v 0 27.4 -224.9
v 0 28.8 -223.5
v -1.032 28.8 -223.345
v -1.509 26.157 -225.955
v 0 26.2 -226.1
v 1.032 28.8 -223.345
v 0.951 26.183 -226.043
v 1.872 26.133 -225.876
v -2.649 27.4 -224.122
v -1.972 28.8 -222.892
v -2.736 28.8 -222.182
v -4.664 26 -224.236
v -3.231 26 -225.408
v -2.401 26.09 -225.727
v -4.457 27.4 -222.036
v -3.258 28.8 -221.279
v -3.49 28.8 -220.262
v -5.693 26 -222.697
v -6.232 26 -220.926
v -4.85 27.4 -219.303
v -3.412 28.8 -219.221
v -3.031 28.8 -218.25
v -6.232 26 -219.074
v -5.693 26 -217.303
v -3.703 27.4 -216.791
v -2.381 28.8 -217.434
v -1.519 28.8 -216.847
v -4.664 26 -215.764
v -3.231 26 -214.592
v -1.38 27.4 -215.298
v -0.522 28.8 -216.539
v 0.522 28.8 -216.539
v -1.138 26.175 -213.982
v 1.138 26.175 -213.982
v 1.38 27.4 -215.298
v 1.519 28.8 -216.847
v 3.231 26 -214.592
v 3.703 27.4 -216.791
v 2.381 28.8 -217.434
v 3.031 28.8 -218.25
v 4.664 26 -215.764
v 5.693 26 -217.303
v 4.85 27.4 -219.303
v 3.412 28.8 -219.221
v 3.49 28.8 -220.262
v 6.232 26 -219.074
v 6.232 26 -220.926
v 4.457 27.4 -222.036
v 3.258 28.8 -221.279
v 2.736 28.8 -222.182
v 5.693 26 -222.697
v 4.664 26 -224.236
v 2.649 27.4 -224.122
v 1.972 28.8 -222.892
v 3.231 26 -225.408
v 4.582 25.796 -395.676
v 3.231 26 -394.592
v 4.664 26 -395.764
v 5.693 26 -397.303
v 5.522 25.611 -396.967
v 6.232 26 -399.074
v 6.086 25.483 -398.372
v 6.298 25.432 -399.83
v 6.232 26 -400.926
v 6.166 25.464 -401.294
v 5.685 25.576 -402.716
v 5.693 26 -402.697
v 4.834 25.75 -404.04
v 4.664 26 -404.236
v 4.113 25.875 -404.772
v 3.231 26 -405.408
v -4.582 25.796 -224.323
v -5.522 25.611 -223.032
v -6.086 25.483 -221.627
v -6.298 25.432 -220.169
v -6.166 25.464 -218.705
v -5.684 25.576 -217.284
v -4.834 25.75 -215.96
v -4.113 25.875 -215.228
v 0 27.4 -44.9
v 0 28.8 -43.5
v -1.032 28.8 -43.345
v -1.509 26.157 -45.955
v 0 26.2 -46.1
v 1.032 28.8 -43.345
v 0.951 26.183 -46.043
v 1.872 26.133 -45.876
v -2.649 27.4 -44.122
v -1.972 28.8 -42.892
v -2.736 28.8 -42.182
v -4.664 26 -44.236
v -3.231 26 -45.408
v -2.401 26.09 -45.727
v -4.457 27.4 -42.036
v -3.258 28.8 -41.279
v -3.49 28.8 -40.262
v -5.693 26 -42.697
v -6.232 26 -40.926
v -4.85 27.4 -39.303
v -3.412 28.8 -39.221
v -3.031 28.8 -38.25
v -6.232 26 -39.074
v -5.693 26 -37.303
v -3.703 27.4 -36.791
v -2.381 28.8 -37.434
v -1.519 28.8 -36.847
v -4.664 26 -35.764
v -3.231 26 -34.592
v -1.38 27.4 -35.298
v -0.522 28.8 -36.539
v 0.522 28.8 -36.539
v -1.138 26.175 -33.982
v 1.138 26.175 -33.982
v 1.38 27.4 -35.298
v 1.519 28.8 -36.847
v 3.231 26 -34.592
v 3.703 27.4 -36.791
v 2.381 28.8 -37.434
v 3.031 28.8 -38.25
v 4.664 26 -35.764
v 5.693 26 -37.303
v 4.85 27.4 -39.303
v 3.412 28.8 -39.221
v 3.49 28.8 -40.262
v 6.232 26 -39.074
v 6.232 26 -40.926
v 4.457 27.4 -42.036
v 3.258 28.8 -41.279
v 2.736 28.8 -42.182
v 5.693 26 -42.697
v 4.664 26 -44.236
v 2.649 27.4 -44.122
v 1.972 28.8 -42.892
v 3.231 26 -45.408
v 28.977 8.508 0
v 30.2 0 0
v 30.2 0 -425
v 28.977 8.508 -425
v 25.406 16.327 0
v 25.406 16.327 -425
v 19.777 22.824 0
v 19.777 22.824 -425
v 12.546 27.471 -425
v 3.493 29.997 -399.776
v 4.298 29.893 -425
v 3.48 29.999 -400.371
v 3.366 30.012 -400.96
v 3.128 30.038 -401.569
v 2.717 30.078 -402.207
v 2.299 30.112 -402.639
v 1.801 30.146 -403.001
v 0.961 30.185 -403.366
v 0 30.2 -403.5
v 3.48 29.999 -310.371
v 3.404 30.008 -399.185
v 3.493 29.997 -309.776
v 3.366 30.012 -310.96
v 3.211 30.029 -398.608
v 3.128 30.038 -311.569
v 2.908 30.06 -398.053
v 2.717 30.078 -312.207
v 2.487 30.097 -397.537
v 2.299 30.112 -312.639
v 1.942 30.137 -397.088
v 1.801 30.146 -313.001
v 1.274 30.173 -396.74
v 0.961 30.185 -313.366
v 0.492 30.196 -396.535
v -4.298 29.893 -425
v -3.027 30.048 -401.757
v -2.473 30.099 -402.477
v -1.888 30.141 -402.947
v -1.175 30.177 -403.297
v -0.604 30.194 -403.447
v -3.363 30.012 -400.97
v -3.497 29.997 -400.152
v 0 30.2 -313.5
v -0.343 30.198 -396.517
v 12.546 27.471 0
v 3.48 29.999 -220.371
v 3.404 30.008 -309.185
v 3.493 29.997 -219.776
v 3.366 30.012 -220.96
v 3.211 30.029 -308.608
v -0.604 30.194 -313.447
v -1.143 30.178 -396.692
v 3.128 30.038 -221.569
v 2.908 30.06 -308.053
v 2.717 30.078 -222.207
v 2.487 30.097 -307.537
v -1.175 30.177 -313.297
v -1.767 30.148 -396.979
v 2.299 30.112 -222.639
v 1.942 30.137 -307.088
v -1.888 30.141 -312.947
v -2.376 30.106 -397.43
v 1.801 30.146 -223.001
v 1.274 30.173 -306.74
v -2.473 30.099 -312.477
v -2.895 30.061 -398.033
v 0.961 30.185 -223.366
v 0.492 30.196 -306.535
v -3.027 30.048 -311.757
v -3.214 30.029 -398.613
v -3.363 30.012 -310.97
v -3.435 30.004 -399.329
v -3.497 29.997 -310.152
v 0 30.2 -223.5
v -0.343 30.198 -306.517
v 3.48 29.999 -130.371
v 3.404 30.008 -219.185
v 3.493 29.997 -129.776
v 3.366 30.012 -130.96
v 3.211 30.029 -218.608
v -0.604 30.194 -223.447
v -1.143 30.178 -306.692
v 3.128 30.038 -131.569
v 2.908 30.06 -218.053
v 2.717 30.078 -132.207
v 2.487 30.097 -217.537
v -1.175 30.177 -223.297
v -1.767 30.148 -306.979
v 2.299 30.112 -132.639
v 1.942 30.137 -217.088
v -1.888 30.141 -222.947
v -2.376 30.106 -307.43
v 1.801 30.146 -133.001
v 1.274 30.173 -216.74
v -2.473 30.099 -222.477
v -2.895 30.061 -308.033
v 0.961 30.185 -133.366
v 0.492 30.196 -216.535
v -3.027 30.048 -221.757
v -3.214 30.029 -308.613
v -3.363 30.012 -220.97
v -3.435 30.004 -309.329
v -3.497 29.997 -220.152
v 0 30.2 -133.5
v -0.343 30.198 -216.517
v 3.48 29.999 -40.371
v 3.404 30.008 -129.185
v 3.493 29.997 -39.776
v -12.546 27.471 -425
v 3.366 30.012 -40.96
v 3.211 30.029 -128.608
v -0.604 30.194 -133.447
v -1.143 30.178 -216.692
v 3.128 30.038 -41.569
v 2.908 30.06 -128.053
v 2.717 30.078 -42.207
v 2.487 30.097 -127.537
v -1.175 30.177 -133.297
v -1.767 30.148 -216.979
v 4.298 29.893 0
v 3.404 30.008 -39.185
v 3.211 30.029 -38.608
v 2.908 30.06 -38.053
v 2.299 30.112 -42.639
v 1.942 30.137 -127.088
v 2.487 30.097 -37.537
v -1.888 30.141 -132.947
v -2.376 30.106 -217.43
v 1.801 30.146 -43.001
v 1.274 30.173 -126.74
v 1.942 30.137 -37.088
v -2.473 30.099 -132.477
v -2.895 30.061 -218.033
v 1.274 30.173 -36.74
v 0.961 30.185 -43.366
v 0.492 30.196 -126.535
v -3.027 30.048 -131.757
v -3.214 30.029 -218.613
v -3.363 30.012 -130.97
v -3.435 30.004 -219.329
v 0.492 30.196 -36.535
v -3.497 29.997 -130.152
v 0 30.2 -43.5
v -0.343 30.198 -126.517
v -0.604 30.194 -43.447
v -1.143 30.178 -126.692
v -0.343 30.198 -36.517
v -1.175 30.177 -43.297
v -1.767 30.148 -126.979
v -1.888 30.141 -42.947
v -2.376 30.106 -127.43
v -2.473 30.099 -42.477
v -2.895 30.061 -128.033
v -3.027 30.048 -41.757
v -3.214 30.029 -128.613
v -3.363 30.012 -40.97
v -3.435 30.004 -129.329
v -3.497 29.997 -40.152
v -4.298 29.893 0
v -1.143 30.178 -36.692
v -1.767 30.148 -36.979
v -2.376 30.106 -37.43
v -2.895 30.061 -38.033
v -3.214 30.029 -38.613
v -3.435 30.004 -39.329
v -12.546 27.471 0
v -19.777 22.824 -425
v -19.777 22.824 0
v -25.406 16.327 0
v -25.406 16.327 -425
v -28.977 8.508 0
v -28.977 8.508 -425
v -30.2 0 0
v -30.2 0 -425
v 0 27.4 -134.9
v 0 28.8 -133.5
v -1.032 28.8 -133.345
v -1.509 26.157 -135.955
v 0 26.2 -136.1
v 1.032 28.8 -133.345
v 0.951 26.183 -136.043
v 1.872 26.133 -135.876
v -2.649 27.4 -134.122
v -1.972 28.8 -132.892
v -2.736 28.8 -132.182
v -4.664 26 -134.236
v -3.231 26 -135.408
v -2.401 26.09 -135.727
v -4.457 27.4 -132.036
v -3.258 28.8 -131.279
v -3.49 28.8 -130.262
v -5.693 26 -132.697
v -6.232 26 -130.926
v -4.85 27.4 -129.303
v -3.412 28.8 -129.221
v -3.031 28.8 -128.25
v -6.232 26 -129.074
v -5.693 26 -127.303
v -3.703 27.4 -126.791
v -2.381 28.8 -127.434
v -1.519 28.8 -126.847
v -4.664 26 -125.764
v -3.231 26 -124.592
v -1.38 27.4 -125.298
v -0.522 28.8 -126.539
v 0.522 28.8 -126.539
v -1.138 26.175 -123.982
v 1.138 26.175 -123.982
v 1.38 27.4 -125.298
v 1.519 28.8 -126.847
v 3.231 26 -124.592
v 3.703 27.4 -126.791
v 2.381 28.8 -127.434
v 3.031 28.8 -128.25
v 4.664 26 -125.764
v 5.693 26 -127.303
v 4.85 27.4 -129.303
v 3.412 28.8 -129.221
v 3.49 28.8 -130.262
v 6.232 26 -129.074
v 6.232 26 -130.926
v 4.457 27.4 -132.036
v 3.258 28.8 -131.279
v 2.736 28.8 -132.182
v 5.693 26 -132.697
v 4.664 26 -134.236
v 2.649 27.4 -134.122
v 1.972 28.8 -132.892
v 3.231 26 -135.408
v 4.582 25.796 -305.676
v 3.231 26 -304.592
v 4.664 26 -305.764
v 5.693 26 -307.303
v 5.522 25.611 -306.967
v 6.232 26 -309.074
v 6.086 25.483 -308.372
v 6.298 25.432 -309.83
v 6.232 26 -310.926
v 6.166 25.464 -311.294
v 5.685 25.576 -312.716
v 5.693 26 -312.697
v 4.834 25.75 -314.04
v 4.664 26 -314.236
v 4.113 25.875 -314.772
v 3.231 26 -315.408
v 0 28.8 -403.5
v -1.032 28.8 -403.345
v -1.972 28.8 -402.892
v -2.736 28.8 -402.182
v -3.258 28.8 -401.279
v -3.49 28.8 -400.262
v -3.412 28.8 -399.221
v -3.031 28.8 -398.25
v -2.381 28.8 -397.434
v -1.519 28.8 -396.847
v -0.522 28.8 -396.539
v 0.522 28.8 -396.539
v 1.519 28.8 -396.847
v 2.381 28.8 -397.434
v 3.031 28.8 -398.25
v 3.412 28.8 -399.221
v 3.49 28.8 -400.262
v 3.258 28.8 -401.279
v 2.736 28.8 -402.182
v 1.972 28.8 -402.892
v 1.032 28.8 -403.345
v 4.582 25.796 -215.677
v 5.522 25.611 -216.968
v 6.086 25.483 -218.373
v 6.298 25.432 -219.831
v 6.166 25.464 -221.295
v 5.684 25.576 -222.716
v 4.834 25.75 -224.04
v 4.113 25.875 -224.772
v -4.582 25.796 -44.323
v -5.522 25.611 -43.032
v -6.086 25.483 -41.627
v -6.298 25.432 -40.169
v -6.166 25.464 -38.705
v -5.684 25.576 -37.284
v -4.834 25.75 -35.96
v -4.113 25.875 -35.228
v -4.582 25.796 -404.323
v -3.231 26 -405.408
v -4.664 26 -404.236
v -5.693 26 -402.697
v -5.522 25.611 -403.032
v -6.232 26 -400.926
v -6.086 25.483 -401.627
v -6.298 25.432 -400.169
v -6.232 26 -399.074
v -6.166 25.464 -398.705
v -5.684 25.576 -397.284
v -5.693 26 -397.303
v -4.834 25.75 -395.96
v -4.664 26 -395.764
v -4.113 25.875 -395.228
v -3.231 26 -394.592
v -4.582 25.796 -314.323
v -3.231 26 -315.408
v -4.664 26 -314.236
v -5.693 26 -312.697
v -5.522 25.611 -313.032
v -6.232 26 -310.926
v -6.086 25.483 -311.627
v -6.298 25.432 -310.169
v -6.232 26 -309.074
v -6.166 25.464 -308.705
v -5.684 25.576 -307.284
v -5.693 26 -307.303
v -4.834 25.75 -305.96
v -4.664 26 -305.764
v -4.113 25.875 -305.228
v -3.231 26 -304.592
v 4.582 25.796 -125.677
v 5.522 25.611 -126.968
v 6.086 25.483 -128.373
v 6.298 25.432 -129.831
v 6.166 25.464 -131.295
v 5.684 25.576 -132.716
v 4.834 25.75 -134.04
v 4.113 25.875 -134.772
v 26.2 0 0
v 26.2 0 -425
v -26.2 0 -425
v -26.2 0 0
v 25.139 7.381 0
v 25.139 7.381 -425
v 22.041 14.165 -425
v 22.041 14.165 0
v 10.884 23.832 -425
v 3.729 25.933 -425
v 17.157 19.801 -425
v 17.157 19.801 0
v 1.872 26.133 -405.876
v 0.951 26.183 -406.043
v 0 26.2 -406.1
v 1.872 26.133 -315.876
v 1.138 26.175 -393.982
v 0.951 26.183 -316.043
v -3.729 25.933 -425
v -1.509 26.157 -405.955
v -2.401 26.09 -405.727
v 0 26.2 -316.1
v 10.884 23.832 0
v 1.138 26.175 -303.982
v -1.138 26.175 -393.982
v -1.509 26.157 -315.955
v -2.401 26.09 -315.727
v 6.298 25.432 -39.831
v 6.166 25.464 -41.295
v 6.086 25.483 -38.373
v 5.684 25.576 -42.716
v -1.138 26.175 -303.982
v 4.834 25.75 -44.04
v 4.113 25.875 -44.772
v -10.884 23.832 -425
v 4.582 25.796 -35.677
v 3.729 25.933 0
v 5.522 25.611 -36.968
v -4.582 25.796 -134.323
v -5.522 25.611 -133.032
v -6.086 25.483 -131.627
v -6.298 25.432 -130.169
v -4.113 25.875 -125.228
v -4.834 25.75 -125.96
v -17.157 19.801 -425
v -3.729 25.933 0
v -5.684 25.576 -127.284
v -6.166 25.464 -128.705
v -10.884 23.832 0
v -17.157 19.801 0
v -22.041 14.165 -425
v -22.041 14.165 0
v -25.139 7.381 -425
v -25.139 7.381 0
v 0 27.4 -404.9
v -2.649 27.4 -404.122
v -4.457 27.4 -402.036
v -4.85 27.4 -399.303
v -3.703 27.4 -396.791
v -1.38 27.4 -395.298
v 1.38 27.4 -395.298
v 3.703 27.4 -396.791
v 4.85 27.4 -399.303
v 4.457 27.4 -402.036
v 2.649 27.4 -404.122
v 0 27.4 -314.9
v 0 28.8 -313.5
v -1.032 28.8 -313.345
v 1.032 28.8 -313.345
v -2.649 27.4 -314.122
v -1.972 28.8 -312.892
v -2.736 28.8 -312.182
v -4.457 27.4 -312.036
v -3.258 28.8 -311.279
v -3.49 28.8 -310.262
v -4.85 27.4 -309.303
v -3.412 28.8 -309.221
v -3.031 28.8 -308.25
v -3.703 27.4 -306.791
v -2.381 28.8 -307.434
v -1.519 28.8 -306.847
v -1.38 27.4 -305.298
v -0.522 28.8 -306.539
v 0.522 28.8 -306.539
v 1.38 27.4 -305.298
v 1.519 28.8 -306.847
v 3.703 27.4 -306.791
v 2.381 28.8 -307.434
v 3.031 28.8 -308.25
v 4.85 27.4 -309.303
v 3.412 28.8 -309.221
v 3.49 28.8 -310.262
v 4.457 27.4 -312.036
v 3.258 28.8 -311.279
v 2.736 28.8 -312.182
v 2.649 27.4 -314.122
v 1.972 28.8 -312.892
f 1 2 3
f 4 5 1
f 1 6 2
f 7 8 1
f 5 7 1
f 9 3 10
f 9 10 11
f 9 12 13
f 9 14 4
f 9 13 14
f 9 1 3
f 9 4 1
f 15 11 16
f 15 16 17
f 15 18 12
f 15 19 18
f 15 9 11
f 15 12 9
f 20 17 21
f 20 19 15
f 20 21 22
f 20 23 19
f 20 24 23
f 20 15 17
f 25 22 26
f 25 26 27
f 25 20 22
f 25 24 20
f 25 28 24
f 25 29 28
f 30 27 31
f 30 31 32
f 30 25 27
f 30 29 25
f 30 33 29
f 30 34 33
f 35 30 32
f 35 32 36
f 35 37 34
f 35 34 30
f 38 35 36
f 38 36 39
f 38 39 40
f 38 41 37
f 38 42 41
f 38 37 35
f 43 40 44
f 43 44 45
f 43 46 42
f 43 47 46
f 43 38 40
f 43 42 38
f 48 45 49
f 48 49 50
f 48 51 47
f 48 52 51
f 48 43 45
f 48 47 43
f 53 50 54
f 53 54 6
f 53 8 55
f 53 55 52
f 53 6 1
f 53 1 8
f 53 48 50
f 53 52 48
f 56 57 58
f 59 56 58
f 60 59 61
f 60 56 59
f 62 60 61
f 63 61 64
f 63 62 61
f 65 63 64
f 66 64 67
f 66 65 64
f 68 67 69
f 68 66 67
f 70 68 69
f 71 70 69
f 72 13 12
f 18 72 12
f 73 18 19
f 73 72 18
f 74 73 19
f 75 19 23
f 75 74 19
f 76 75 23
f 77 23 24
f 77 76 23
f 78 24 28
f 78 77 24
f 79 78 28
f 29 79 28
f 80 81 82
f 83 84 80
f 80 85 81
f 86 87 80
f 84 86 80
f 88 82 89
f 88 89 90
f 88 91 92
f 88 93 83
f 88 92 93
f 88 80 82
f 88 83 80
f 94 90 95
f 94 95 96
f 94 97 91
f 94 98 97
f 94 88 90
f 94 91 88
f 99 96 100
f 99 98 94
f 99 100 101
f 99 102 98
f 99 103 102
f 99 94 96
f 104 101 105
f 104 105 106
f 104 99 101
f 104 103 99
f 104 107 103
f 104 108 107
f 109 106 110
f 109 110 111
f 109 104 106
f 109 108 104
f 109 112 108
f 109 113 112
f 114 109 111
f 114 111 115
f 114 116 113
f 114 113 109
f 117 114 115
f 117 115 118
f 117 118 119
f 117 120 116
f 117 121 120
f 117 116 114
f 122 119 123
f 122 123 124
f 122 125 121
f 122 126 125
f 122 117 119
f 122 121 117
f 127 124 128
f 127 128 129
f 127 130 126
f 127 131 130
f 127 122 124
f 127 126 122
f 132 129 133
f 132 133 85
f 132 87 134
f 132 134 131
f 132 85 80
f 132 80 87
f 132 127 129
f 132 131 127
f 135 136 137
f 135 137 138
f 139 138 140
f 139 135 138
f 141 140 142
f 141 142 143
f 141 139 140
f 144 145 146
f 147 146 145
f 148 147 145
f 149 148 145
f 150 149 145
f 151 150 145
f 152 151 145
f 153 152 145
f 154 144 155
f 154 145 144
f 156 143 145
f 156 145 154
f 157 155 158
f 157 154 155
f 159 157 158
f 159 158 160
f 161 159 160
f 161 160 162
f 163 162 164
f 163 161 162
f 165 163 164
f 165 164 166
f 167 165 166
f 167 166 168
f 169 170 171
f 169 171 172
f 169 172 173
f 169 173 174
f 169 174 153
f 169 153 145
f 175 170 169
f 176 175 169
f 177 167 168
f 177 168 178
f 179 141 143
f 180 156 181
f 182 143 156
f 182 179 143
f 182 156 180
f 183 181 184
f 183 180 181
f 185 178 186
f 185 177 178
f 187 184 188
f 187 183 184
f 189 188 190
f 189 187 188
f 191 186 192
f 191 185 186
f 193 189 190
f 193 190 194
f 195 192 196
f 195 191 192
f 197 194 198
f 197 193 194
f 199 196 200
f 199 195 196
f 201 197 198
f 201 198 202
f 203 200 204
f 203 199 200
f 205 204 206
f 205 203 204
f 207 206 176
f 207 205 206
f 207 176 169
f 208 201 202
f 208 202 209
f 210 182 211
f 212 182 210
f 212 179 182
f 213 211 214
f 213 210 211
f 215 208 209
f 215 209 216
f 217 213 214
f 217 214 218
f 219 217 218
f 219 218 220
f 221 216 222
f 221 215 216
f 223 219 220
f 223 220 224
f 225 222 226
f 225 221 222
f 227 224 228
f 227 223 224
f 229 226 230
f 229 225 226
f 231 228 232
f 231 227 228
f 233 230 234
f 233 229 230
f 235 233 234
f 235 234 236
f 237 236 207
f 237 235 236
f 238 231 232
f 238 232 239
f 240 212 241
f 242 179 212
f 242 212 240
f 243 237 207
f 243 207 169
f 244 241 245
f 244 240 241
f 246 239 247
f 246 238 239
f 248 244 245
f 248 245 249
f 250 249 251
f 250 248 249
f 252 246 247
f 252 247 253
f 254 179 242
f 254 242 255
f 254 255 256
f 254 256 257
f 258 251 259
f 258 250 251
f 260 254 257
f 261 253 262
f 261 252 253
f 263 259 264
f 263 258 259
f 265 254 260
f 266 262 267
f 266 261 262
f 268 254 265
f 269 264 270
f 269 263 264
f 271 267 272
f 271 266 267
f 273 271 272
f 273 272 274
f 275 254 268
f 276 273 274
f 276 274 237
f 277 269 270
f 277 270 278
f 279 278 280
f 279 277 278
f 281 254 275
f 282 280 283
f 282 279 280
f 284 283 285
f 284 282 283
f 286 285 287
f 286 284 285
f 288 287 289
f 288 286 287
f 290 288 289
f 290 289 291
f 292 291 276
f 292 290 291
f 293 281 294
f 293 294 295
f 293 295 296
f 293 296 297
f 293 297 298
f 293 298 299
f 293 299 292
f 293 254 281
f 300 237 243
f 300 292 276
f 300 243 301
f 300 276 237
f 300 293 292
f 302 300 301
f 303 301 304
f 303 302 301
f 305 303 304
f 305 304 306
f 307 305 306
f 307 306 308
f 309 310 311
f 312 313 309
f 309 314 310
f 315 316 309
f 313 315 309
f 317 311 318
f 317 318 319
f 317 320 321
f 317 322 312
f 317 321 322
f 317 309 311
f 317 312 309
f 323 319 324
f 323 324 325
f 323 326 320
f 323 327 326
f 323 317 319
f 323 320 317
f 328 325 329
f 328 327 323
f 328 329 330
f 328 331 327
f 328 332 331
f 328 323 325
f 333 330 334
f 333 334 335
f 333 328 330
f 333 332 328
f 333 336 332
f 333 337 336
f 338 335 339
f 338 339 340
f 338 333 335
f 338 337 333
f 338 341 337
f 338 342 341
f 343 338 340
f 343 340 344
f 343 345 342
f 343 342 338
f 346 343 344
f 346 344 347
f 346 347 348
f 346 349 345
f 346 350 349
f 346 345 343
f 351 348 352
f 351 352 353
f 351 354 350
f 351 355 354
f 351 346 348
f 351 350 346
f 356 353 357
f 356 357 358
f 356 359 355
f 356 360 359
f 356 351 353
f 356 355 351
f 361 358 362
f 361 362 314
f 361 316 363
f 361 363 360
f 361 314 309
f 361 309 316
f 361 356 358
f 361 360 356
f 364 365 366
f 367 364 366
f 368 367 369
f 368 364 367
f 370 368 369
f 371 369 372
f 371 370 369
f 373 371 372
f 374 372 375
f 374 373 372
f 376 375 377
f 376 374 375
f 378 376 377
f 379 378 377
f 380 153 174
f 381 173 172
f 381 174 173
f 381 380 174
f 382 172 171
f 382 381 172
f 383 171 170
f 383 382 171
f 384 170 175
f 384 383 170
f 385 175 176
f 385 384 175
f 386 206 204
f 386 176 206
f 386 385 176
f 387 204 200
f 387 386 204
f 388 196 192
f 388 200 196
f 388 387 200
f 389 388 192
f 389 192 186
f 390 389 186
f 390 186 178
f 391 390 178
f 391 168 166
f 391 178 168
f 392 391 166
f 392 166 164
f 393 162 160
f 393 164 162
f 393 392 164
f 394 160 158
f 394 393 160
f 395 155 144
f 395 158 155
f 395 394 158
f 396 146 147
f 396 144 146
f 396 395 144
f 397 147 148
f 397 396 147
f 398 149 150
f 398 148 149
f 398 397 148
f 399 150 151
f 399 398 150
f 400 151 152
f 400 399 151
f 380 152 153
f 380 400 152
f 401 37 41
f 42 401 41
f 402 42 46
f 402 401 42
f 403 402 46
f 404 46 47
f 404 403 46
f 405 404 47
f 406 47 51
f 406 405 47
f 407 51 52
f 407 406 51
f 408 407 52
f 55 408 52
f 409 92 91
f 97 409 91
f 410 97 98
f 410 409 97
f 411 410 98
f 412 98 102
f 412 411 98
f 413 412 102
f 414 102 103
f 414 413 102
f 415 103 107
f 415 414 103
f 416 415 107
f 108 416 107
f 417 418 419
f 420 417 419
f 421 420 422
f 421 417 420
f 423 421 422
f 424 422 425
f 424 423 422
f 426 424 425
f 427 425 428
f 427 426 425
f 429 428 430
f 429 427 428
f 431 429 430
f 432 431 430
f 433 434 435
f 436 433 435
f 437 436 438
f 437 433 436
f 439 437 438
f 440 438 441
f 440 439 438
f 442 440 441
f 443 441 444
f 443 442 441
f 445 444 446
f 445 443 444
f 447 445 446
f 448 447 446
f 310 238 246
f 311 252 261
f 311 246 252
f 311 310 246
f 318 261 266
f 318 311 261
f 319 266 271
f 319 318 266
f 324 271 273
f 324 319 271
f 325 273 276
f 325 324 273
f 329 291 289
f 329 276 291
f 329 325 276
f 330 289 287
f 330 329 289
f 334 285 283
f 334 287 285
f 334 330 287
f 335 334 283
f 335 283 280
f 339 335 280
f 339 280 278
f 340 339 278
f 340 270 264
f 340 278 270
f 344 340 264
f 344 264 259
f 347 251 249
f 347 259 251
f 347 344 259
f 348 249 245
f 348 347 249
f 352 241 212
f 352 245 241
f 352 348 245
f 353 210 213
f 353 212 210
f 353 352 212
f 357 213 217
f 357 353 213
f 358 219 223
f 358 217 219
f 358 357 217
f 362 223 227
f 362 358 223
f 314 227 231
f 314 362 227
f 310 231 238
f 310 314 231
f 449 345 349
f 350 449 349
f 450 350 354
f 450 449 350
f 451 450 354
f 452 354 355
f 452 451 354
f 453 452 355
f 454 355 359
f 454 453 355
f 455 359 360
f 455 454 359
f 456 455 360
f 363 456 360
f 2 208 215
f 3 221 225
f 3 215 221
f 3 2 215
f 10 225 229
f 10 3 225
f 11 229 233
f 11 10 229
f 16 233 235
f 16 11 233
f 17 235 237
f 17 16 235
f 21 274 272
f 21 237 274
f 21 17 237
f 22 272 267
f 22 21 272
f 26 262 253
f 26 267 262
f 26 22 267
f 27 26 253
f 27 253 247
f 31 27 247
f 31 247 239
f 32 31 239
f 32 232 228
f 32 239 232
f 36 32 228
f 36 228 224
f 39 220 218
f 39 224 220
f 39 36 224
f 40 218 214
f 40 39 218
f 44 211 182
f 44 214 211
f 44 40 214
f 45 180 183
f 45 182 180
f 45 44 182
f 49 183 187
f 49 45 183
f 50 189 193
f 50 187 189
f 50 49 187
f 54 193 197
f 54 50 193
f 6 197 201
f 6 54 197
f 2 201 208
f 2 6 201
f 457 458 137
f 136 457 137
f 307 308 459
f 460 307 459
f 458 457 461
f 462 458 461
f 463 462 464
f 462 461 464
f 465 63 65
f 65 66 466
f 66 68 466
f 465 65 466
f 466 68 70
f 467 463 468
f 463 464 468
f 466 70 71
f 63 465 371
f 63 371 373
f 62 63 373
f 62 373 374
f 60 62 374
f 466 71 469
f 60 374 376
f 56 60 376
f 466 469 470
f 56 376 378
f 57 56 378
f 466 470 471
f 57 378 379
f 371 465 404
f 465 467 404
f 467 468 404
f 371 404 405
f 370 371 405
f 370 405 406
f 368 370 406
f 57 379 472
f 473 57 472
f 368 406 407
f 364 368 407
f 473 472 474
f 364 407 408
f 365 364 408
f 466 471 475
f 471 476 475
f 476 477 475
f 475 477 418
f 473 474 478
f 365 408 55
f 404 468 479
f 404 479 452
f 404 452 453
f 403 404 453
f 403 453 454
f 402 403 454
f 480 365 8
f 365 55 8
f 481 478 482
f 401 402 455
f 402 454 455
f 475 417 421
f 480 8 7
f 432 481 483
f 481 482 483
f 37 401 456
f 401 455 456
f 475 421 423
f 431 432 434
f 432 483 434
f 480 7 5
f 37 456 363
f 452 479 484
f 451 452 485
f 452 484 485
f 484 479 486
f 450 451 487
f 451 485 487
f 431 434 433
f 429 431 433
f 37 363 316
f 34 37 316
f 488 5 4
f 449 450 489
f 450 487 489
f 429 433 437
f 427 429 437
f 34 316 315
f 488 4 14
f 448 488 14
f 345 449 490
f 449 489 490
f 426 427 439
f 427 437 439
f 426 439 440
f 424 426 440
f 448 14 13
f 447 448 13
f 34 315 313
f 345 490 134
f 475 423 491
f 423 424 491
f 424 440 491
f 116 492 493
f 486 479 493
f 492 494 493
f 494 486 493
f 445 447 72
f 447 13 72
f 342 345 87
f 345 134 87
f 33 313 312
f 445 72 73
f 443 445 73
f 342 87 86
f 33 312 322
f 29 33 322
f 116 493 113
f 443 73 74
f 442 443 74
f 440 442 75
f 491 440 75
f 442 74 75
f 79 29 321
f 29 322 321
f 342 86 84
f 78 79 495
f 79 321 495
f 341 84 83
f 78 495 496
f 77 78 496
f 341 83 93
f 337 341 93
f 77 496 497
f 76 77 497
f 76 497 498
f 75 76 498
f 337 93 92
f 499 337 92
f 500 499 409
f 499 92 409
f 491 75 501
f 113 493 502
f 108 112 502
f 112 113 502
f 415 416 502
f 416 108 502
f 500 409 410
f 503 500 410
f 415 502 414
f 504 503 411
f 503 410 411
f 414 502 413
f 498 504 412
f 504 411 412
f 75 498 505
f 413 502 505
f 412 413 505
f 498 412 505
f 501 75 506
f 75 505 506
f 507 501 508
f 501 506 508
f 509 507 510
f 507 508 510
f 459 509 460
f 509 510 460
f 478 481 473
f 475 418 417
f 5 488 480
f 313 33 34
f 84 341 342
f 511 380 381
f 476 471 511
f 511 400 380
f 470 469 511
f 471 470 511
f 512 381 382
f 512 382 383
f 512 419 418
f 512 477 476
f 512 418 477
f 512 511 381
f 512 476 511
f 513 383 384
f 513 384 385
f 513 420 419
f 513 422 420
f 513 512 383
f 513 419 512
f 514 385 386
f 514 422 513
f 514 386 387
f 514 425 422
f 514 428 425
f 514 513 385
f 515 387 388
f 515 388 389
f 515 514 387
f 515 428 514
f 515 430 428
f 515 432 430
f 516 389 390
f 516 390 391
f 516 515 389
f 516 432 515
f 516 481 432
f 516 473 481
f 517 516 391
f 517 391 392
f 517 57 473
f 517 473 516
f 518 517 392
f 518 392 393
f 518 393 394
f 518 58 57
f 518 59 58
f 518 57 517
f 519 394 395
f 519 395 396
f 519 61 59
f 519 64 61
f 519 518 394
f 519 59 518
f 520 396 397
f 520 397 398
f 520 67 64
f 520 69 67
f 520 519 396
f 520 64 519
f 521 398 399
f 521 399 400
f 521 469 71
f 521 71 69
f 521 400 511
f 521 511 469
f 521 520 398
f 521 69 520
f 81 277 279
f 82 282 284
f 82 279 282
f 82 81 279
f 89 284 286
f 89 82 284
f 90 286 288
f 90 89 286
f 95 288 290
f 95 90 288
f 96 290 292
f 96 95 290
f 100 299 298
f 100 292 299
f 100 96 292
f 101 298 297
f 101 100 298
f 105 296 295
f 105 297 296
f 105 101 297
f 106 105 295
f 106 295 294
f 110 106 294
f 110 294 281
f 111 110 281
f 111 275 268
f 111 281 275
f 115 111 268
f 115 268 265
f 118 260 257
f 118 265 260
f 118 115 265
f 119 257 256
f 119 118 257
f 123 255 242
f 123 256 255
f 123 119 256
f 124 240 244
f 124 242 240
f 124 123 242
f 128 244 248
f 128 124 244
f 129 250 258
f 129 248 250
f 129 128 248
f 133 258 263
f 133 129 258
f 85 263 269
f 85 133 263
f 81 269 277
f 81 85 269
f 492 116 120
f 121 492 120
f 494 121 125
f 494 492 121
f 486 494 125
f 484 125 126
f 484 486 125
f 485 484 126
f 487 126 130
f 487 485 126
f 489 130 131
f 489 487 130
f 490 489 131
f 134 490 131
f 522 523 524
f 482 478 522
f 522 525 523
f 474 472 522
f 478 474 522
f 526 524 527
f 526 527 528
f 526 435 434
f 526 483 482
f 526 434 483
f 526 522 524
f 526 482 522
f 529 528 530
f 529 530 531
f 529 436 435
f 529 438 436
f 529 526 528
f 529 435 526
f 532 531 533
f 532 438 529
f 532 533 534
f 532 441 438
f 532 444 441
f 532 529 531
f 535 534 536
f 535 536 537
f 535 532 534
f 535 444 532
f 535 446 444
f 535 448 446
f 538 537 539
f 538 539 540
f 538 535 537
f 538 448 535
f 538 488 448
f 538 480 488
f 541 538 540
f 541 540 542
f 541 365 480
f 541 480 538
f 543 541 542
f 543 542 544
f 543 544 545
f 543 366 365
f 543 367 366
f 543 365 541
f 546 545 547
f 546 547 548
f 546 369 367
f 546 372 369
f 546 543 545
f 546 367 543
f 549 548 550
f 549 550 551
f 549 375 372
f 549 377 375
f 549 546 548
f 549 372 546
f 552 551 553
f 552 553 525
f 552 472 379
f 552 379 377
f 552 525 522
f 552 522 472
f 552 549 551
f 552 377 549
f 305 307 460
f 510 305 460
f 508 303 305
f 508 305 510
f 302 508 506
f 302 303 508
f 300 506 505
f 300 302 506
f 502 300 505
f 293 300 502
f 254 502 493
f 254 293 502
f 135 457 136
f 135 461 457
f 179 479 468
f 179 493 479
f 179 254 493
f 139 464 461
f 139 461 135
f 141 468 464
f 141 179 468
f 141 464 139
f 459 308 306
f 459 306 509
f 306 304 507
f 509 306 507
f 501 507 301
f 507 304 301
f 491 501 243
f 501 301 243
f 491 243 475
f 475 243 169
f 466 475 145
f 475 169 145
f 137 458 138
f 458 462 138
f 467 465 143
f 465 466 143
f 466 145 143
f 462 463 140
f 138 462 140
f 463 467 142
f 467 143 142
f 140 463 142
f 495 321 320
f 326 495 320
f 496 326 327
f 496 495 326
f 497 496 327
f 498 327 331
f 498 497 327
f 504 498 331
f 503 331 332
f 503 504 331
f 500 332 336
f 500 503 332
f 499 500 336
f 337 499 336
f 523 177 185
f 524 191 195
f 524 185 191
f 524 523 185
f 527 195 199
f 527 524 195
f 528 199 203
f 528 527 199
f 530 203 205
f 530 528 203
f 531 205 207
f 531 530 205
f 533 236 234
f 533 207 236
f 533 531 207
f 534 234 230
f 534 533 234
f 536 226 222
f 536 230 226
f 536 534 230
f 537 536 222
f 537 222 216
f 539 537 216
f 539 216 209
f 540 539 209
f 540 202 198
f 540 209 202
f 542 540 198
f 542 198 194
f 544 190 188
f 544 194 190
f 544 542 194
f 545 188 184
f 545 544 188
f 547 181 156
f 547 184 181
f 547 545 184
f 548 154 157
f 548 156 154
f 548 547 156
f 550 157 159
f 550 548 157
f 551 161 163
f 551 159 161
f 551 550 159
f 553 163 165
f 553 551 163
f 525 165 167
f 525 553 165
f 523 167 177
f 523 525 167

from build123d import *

# Parameters (mm, degrees)
SKETCH2_R                                      = 30.2
BOSS_EXTRUDE1_DEPTH                            = 425
SKETCH3_R                                      = 26.2
CUT_EXTRUDE1_DEPTH                             = 426
CUT_EXTRUDE2_REACH                             = 32.2
SKETCH4_W                                      = 60.4
SKETCH4_H                                      = 425
CSK_FOR_M6_FLAT_HEAD_MACHINE_SCREW1_AT_2_COUNT = 2
CSK_FOR_M6_FLAT_HEAD_MACHINE_SCREW1_AT_2_PITCH = 90
CSK_FOR_M6_FLAT_HEAD_MACHINE_SCREW1_AT_3_COUNT = 2
CSK_FOR_M6_FLAT_HEAD_MACHINE_SCREW1_AT_3_PITCH = 180
CSK_FOR_M6_FLAT_HEAD_MACHINE_SCREW1_AT_4_COUNT = 2
CSK_FOR_M6_FLAT_HEAD_MACHINE_SCREW1_AT_4_PITCH = 270
CSK_FOR_M6_FLAT_HEAD_MACHINE_SCREW1_AT_5_COUNT = 2
CSK_FOR_M6_FLAT_HEAD_MACHINE_SCREW1_AT_5_PITCH = 360


with BuildPart() as part:
    # Sketch2 → Boss-Extrude1 (new body)
    with BuildSketch(Plane.XY):
        Circle(SKETCH2_R)
    extrude(amount=-BOSS_EXTRUDE1_DEPTH)

    # Sketch3 → Cut-Extrude1 (cut, through all)
    with BuildSketch(Plane.XY):
        Circle(SKETCH3_R)
    extrude(amount=-CUT_EXTRUDE1_DEPTH, mode=Mode.SUBTRACT)

    # Sketch4 → Cut-Extrude2 (cut, up to next)
    with BuildSketch(Plane(origin=(0, 0, 0), x_dir=(1, 0, 0), z_dir=(0, 1, 0)), mode=Mode.PRIVATE) as cut_extrude2_sk1:
        with Locations((0, 212.5)):
            Rectangle(SKETCH4_W, SKETCH4_H)
    cut_extrude2_tool1 = extrude(cut_extrude2_sk1.sketch, amount=-CUT_EXTRUDE2_REACH, mode=Mode.PRIVATE) & part.part
    add(cut_extrude2_tool1.solids().sort_by_distance((0, 0, -212.5))[0], mode=Mode.SUBTRACT)

    # Sketch10 → CSK for M6 Flat Head Machine Screw1 (revolve, cut)
    with BuildSketch(Plane(origin=(0, 0, -40), x_dir=(0, 0, -1), z_dir=(1, 0, 0))):
        Polygon((0, 0), (0, 30.2), (3.5, 30.2), (3.5, 28.8), (6.3, 26), (6.3, 0), align=None)
    csk_for_m6_flat_head_machine_screw1 = revolve(axis=Axis((0, -6.35, -40), (0, 1, 0)), mode=Mode.SUBTRACT)

    # CSK for M6 Flat Head Machine Screw1 at 2: CSK for M6 Flat Head Machine Screw1 ×2
    with Locations(*[(0, 0, -i * CSK_FOR_M6_FLAT_HEAD_MACHINE_SCREW1_AT_2_PITCH) for i in range(1, CSK_FOR_M6_FLAT_HEAD_MACHINE_SCREW1_AT_2_COUNT)]):
        add(csk_for_m6_flat_head_machine_screw1, mode=Mode.SUBTRACT)

    # CSK for M6 Flat Head Machine Screw1 at 3: CSK for M6 Flat Head Machine Screw1 ×2
    with Locations(*[(0, 0, -i * CSK_FOR_M6_FLAT_HEAD_MACHINE_SCREW1_AT_3_PITCH) for i in range(1, CSK_FOR_M6_FLAT_HEAD_MACHINE_SCREW1_AT_3_COUNT)]):
        add(csk_for_m6_flat_head_machine_screw1, mode=Mode.SUBTRACT)

    # CSK for M6 Flat Head Machine Screw1 at 4: CSK for M6 Flat Head Machine Screw1 ×2
    with Locations(*[(0, 0, -i * CSK_FOR_M6_FLAT_HEAD_MACHINE_SCREW1_AT_4_PITCH) for i in range(1, CSK_FOR_M6_FLAT_HEAD_MACHINE_SCREW1_AT_4_COUNT)]):
        add(csk_for_m6_flat_head_machine_screw1, mode=Mode.SUBTRACT)

    # CSK for M6 Flat Head Machine Screw1 at 5: CSK for M6 Flat Head Machine Screw1 ×2
    with Locations(*[(0, 0, -i * CSK_FOR_M6_FLAT_HEAD_MACHINE_SCREW1_AT_5_PITCH) for i in range(1, CSK_FOR_M6_FLAT_HEAD_MACHINE_SCREW1_AT_5_COUNT)]):
        add(csk_for_m6_flat_head_machine_screw1, mode=Mode.SUBTRACT)


solid = part.part
